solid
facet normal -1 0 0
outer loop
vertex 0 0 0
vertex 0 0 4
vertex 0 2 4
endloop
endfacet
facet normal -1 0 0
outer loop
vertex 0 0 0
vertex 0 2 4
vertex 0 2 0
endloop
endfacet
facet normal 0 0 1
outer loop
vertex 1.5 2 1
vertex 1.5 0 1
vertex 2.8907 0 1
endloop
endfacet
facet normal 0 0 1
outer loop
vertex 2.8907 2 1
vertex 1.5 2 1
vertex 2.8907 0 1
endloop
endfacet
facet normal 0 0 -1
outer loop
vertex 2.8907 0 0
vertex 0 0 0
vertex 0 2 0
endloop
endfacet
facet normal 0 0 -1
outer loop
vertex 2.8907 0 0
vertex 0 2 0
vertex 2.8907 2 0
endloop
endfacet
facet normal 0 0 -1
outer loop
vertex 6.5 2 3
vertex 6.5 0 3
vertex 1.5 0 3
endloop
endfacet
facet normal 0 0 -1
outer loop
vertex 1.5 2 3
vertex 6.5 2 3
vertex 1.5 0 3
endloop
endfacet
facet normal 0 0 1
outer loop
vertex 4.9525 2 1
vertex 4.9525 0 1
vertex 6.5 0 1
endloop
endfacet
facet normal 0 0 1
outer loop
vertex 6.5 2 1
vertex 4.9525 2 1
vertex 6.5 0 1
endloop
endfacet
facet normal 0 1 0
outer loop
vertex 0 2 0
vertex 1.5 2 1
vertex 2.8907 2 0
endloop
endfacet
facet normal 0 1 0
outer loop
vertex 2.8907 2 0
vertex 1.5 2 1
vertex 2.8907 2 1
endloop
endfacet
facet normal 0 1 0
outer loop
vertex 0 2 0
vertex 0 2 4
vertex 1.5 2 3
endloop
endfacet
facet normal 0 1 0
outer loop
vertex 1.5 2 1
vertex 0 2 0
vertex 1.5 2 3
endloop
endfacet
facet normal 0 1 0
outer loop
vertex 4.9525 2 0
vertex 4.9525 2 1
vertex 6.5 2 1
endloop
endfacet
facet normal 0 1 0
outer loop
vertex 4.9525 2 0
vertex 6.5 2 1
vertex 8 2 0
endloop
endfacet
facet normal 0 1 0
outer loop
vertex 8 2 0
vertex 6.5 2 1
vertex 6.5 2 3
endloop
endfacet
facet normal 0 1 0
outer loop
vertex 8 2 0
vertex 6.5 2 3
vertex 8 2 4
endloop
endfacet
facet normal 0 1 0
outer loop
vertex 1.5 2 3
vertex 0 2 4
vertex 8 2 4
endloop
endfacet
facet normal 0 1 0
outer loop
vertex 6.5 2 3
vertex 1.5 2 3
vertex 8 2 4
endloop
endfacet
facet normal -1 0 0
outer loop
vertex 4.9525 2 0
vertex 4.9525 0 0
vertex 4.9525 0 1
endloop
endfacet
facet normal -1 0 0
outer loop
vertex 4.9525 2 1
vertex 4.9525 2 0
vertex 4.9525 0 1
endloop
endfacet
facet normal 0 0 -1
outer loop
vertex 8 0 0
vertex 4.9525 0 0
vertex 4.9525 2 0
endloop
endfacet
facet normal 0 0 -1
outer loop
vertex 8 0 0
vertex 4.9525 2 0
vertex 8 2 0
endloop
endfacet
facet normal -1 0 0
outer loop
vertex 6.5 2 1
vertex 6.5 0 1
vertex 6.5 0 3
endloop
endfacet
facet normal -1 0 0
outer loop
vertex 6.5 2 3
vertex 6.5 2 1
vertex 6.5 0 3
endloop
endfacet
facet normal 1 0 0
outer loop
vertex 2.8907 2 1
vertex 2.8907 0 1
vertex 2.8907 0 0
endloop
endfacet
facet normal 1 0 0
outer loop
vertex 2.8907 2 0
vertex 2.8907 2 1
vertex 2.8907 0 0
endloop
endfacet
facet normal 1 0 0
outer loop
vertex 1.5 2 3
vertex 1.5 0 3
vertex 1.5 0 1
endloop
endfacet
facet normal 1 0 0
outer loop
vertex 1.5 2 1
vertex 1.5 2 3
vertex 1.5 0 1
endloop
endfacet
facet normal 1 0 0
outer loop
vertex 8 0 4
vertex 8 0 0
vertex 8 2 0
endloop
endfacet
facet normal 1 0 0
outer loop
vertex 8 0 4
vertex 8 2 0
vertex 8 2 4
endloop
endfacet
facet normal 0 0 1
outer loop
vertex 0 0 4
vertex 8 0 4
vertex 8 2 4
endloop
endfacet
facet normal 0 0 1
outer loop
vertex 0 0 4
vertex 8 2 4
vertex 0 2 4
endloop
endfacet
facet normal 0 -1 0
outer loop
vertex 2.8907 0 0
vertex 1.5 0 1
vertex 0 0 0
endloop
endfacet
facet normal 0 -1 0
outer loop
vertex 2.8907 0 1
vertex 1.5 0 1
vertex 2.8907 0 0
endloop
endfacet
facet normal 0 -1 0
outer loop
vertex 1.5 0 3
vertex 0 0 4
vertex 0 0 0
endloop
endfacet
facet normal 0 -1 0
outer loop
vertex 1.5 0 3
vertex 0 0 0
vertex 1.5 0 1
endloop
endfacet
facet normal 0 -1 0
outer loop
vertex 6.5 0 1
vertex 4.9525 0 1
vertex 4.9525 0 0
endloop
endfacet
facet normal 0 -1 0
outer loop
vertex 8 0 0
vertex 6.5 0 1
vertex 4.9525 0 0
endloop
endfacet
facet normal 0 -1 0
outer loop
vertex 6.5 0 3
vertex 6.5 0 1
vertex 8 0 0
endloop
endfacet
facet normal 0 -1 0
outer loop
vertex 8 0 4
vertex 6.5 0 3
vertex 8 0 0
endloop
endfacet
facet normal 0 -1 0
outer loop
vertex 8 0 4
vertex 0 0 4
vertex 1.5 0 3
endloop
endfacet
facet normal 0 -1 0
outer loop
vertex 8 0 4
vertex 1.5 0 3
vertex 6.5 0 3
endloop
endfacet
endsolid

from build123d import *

# Parameters (mm, degrees)
F1_DEPTH = 2
F2_DEPTH = 25


with BuildPart() as f1:
    # F0 (on Front) → F1 (new body)
    with BuildSketch(Plane.XZ):
        Polygon((0, 4), (0, 0), (2.890676, 0), (2.890676, 1), (1.5, 1), (1.5, 3), (6.5, 3), (6.5, 1), (4.952536, 1), (4.952536, 0), (8, 0), (8, 4), align=None)
        Polygon((2.890676, 1), (2.890676, 0), (4.952536, 0), (4.952536, 1), (6.5, 1), (6.5, 3), (1.5, 3), (1.5, 1), align=None)
    extrude(amount=-F1_DEPTH)

    # F0 (on Front) → F2 (cut)
    with BuildSketch(Plane.XZ):
        Polygon((2.890676, 1), (2.890676, 0), (4.952536, 0), (4.952536, 1), (6.5, 1), (6.5, 3), (1.5, 3), (1.5, 1), align=None)
    extrude(amount=-F2_DEPTH, mode=Mode.SUBTRACT)


solid = f1.part
